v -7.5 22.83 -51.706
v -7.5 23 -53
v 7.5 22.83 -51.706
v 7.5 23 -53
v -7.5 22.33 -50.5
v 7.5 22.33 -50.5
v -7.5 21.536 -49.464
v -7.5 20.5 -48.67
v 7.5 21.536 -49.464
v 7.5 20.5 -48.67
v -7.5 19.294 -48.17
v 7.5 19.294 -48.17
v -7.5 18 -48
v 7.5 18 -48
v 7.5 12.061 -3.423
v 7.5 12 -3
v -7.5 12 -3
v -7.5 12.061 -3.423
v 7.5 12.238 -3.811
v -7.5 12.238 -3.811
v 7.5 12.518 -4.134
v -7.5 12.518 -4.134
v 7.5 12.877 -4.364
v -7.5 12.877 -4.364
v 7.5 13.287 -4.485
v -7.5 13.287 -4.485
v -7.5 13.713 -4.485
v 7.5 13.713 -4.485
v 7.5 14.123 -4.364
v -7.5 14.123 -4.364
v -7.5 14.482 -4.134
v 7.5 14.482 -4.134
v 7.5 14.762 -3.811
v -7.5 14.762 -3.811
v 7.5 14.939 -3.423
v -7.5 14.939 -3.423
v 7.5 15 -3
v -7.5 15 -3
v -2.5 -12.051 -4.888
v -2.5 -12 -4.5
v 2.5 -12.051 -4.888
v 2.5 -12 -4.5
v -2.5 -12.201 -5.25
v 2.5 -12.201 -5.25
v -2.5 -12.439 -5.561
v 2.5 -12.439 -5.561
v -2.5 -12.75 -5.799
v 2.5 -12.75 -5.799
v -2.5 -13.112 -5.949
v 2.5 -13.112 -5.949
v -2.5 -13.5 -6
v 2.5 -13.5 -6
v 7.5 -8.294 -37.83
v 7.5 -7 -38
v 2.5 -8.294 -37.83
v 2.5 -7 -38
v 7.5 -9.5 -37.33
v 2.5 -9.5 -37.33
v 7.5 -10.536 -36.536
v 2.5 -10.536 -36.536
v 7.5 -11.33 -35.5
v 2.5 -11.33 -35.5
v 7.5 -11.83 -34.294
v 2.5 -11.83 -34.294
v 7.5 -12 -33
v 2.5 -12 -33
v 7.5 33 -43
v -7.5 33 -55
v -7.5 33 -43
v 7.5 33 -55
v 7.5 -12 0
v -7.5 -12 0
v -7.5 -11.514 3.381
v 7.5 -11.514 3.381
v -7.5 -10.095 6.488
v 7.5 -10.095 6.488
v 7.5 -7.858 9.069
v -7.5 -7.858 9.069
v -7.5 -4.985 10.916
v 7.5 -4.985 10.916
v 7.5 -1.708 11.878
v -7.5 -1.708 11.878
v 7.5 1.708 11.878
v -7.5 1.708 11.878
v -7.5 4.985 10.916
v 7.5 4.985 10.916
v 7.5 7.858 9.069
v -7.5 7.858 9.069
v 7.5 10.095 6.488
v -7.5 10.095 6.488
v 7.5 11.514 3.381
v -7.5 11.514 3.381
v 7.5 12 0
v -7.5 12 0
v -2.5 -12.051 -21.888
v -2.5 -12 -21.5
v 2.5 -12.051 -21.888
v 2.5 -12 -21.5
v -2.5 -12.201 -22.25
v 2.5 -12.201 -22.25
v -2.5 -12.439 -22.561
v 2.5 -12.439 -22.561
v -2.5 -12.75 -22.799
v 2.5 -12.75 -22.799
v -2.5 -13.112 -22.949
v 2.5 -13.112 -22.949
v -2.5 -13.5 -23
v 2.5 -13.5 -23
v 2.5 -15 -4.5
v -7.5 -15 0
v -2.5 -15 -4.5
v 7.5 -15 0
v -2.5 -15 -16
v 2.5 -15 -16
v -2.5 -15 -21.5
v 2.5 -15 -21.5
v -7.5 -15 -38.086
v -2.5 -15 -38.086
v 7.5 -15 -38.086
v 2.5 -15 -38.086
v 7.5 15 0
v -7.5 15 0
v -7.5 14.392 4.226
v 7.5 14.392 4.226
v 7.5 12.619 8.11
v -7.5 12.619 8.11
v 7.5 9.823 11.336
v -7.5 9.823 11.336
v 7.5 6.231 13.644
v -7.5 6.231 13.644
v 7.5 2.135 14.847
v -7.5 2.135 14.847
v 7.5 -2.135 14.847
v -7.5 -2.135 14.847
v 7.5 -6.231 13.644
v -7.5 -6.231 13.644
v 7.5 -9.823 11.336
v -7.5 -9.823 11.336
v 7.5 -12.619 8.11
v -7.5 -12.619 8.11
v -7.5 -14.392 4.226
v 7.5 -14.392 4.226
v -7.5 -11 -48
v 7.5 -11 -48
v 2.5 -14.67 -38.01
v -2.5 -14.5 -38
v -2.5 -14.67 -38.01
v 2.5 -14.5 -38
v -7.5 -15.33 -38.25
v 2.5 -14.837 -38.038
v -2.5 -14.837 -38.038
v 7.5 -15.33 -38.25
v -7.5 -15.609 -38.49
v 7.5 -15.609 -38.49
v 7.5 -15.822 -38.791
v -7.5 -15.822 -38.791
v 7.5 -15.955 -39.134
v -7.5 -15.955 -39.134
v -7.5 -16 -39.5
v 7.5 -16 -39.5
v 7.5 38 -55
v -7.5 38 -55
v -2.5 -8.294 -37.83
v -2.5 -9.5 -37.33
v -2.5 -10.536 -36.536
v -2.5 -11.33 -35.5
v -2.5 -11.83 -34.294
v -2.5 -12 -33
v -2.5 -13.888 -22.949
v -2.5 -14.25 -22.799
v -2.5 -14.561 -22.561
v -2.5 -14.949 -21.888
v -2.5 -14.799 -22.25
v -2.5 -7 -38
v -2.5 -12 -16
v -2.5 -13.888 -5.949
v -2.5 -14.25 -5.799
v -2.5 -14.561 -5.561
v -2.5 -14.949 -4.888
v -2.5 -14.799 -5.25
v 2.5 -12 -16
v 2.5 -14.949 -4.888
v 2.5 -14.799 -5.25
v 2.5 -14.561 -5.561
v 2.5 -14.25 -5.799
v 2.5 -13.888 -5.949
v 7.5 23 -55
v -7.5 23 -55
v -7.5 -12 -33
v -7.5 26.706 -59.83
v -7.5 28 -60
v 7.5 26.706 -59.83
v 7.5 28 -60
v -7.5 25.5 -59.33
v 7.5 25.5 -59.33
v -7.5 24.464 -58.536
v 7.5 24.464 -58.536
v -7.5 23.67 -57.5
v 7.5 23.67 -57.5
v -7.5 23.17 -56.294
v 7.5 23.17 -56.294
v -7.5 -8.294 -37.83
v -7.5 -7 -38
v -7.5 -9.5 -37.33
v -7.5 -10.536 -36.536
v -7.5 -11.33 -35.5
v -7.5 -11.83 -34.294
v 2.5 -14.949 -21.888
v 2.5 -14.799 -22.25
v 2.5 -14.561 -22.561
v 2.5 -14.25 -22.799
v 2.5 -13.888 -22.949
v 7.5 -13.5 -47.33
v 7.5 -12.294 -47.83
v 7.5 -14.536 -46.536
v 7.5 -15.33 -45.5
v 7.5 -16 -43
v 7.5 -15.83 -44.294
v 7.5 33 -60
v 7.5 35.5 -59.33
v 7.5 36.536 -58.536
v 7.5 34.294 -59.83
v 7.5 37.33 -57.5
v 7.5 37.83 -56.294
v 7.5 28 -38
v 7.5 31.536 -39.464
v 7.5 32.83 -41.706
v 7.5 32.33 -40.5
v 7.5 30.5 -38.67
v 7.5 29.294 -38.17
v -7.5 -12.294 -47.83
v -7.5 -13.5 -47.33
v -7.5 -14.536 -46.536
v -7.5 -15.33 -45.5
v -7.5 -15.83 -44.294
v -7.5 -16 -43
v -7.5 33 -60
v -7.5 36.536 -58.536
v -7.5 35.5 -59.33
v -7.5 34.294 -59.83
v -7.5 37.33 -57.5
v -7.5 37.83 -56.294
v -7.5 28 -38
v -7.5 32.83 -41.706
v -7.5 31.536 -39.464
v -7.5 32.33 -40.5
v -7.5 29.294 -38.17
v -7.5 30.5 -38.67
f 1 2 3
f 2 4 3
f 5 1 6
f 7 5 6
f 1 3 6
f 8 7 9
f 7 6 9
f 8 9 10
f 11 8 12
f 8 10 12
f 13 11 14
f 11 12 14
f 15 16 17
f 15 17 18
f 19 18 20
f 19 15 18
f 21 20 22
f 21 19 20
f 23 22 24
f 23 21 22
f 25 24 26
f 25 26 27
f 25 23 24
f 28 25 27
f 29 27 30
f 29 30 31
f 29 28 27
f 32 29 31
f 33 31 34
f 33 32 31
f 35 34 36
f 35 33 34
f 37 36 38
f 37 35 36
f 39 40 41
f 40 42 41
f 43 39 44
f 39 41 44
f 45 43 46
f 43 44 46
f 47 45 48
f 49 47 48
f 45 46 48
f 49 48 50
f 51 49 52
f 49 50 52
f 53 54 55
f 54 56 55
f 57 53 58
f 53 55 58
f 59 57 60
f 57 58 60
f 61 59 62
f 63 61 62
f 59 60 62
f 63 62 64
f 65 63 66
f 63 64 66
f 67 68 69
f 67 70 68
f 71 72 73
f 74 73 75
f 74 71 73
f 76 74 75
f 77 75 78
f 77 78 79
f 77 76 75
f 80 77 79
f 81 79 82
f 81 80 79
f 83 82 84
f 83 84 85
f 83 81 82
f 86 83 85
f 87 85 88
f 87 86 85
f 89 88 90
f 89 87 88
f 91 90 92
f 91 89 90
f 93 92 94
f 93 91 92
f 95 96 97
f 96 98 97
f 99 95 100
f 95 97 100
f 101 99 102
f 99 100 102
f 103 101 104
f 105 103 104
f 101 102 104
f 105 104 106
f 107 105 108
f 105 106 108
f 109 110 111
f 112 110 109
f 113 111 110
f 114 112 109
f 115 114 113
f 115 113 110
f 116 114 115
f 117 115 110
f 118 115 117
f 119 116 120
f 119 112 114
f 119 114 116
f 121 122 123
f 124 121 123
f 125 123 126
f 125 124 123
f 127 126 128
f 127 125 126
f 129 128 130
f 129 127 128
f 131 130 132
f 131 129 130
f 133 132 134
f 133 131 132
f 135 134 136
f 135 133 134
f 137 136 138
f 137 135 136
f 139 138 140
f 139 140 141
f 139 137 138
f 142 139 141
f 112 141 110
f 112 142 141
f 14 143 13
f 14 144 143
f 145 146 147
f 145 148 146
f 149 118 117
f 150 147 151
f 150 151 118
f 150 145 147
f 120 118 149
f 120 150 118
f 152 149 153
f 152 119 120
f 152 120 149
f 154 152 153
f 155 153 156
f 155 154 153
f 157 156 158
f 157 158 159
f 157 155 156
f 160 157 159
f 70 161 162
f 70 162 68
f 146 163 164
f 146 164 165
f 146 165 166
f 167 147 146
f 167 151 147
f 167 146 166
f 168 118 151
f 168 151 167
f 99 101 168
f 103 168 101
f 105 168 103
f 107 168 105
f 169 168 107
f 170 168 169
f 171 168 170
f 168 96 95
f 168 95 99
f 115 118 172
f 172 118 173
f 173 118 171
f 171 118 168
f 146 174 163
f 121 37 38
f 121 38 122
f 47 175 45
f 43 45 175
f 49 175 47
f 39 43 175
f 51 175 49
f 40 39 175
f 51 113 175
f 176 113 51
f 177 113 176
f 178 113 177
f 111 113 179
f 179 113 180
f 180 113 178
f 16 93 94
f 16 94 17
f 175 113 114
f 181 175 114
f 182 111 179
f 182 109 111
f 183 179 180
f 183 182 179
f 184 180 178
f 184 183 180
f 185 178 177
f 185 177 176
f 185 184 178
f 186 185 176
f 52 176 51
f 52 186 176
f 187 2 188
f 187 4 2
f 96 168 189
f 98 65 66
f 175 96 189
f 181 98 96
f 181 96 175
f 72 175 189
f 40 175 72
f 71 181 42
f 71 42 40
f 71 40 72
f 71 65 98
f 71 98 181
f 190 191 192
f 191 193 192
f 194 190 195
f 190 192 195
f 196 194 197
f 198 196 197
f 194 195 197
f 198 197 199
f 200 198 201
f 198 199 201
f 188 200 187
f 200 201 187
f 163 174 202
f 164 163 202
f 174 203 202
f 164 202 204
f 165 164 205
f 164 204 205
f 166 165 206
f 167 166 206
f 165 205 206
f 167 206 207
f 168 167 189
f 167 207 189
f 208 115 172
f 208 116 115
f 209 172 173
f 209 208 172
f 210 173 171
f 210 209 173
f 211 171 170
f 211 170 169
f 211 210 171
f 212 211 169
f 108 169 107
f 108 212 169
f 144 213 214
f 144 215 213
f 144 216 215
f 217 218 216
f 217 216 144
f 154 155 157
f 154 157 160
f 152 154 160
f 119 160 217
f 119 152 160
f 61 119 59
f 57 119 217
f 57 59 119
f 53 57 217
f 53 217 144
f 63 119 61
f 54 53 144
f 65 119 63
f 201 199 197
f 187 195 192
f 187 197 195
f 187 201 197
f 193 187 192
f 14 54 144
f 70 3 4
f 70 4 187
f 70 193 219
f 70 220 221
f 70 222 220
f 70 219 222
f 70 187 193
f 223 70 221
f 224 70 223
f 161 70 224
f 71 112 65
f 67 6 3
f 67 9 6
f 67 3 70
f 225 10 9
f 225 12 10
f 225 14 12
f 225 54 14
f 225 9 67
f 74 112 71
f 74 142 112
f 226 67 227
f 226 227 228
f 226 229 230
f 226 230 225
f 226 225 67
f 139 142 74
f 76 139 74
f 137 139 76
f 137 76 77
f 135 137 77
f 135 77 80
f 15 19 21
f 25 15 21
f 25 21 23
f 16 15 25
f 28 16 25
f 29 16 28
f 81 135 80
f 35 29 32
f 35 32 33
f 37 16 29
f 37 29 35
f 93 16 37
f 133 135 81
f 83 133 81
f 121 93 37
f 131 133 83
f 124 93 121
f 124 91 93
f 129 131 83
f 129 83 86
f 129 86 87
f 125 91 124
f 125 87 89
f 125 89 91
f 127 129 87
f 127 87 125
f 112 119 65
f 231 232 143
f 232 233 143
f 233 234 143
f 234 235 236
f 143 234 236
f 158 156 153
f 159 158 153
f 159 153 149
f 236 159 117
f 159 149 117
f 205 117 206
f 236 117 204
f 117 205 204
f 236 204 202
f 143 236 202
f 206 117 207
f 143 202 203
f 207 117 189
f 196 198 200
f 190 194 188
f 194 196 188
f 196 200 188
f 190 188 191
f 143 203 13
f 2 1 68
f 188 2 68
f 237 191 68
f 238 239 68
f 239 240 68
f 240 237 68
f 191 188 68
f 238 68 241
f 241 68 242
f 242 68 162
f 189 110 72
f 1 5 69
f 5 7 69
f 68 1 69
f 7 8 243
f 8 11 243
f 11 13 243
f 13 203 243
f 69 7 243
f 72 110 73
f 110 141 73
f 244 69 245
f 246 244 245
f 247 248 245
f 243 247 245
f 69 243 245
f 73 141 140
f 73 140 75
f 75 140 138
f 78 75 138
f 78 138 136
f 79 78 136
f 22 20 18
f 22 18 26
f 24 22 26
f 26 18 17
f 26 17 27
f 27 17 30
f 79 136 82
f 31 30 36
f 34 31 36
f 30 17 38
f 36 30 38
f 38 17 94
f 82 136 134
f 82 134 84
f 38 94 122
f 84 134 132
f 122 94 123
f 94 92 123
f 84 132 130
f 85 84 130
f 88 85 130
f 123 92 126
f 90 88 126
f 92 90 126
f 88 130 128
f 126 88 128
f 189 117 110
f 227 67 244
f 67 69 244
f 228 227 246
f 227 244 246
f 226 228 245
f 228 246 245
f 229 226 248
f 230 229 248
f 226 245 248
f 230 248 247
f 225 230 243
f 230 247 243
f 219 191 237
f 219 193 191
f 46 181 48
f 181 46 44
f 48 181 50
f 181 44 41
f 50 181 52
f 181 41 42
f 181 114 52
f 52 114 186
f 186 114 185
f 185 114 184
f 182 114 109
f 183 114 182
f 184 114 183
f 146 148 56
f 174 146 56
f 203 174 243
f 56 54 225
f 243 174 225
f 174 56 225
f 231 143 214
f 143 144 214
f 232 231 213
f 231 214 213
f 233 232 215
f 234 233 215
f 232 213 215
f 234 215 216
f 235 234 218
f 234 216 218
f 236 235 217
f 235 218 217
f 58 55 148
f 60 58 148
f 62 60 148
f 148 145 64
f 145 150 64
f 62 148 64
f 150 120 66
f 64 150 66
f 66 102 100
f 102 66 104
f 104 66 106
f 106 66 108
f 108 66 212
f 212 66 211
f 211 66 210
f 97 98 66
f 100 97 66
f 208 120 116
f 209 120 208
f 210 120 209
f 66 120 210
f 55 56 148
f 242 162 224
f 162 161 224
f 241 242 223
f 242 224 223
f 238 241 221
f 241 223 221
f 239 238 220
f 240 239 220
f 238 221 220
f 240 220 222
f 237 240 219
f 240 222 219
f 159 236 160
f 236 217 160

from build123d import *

# Parameters (mm, degrees)
F0_W          = 1
F0_H          = 10
F1_DEPTH      = 7.5
F1_DEPTH_BACK = 7.5
F2_W          = 5
F2_H          = 10
F2_H_2        = 15
F3_DEPTH      = 3
F4_R          = 1.49999
F5_R          = 4.99999


# Not quite as in the source:
# - a fillet or chamfer is up to 0.001 mm smaller than in the source, because OpenCascade refuses the exact size


with BuildPart() as f1:
    # F0 (on Right) → F1 (new body, two sides)
    with BuildSketch(Plane.YZ) as f1_sk:
        with BuildLine():
            ThreePointArc((-12, 0), (0, 12), (12, 0))
            Line((12, 0), (12, -3))
            ThreePointArc((12, -3), (13.5, -4.5), (15, -3))
            Line((15, -3), (15, 0))
            ThreePointArc((15, 0), (0, 15), (-15, 0))
            Line((-15, 0), (-15, -38))
            Line((-15, -38), (-15, -48))
            Line((-15, -48), (-12, -48))
            Line((-12, -48), (23, -48))
            Line((23, -48), (23, -60))
            Line((23, -60), (33, -60))
            Line((33, -60), (38, -60))
            Line((38, -60), (38, -55))
            Line((38, -55), (33, -55))
            Line((33, -55), (33, -48))
            Line((33, -48), (33, -38))
            Line((33, -38), (-12, -38))
            Line((-12, -38), (-12, 0))
        make_face()
        with Locations((-15.5, -43)):
            Rectangle(F0_W, F0_H)
    extrude(amount=F1_DEPTH)
    extrude(f1_sk.sketch, amount=-F1_DEPTH_BACK)

    # F2 (on face) → F3 (cut, through all)
    with BuildSketch(Plane.XZ.offset(15)):
        with Locations((0, -11)):
            Rectangle(F2_W, F2_H)
        with Locations((0, -30.5)):
            Rectangle(F2_W, F2_H_2)
    extrude(amount=-F3_DEPTH, mode=Mode.SUBTRACT)

    # F4 (radius 1.5 in the source; OpenCascade refuses exactly that, so slightly less here)
    f4_edges = [f1.edges().sort_by_distance(p)[0] for p in [
        (0, -15, -6),
        (0, -12, -6),
        (0, -15, -23),
        (0, -12, -23),
        (0, -16, -38),
    ]]
    fillet(f4_edges, radius=F4_R)

    # F5 (radius 5 in the source; OpenCascade refuses exactly that, so slightly less here)
    f5_edges = [f1.edges().sort_by_distance(p)[0] for p in [
        (5, -12, -38),
        (-5, -12, -38),
        (0, 33, -38),
        (0, 38, -60),
        (0, 23, -60),
        (0, 23, -48),
        (0, -15, 0),
        (0, -16, -48),
    ]]
    fillet(f5_edges, radius=F5_R)


solid = f1.part
